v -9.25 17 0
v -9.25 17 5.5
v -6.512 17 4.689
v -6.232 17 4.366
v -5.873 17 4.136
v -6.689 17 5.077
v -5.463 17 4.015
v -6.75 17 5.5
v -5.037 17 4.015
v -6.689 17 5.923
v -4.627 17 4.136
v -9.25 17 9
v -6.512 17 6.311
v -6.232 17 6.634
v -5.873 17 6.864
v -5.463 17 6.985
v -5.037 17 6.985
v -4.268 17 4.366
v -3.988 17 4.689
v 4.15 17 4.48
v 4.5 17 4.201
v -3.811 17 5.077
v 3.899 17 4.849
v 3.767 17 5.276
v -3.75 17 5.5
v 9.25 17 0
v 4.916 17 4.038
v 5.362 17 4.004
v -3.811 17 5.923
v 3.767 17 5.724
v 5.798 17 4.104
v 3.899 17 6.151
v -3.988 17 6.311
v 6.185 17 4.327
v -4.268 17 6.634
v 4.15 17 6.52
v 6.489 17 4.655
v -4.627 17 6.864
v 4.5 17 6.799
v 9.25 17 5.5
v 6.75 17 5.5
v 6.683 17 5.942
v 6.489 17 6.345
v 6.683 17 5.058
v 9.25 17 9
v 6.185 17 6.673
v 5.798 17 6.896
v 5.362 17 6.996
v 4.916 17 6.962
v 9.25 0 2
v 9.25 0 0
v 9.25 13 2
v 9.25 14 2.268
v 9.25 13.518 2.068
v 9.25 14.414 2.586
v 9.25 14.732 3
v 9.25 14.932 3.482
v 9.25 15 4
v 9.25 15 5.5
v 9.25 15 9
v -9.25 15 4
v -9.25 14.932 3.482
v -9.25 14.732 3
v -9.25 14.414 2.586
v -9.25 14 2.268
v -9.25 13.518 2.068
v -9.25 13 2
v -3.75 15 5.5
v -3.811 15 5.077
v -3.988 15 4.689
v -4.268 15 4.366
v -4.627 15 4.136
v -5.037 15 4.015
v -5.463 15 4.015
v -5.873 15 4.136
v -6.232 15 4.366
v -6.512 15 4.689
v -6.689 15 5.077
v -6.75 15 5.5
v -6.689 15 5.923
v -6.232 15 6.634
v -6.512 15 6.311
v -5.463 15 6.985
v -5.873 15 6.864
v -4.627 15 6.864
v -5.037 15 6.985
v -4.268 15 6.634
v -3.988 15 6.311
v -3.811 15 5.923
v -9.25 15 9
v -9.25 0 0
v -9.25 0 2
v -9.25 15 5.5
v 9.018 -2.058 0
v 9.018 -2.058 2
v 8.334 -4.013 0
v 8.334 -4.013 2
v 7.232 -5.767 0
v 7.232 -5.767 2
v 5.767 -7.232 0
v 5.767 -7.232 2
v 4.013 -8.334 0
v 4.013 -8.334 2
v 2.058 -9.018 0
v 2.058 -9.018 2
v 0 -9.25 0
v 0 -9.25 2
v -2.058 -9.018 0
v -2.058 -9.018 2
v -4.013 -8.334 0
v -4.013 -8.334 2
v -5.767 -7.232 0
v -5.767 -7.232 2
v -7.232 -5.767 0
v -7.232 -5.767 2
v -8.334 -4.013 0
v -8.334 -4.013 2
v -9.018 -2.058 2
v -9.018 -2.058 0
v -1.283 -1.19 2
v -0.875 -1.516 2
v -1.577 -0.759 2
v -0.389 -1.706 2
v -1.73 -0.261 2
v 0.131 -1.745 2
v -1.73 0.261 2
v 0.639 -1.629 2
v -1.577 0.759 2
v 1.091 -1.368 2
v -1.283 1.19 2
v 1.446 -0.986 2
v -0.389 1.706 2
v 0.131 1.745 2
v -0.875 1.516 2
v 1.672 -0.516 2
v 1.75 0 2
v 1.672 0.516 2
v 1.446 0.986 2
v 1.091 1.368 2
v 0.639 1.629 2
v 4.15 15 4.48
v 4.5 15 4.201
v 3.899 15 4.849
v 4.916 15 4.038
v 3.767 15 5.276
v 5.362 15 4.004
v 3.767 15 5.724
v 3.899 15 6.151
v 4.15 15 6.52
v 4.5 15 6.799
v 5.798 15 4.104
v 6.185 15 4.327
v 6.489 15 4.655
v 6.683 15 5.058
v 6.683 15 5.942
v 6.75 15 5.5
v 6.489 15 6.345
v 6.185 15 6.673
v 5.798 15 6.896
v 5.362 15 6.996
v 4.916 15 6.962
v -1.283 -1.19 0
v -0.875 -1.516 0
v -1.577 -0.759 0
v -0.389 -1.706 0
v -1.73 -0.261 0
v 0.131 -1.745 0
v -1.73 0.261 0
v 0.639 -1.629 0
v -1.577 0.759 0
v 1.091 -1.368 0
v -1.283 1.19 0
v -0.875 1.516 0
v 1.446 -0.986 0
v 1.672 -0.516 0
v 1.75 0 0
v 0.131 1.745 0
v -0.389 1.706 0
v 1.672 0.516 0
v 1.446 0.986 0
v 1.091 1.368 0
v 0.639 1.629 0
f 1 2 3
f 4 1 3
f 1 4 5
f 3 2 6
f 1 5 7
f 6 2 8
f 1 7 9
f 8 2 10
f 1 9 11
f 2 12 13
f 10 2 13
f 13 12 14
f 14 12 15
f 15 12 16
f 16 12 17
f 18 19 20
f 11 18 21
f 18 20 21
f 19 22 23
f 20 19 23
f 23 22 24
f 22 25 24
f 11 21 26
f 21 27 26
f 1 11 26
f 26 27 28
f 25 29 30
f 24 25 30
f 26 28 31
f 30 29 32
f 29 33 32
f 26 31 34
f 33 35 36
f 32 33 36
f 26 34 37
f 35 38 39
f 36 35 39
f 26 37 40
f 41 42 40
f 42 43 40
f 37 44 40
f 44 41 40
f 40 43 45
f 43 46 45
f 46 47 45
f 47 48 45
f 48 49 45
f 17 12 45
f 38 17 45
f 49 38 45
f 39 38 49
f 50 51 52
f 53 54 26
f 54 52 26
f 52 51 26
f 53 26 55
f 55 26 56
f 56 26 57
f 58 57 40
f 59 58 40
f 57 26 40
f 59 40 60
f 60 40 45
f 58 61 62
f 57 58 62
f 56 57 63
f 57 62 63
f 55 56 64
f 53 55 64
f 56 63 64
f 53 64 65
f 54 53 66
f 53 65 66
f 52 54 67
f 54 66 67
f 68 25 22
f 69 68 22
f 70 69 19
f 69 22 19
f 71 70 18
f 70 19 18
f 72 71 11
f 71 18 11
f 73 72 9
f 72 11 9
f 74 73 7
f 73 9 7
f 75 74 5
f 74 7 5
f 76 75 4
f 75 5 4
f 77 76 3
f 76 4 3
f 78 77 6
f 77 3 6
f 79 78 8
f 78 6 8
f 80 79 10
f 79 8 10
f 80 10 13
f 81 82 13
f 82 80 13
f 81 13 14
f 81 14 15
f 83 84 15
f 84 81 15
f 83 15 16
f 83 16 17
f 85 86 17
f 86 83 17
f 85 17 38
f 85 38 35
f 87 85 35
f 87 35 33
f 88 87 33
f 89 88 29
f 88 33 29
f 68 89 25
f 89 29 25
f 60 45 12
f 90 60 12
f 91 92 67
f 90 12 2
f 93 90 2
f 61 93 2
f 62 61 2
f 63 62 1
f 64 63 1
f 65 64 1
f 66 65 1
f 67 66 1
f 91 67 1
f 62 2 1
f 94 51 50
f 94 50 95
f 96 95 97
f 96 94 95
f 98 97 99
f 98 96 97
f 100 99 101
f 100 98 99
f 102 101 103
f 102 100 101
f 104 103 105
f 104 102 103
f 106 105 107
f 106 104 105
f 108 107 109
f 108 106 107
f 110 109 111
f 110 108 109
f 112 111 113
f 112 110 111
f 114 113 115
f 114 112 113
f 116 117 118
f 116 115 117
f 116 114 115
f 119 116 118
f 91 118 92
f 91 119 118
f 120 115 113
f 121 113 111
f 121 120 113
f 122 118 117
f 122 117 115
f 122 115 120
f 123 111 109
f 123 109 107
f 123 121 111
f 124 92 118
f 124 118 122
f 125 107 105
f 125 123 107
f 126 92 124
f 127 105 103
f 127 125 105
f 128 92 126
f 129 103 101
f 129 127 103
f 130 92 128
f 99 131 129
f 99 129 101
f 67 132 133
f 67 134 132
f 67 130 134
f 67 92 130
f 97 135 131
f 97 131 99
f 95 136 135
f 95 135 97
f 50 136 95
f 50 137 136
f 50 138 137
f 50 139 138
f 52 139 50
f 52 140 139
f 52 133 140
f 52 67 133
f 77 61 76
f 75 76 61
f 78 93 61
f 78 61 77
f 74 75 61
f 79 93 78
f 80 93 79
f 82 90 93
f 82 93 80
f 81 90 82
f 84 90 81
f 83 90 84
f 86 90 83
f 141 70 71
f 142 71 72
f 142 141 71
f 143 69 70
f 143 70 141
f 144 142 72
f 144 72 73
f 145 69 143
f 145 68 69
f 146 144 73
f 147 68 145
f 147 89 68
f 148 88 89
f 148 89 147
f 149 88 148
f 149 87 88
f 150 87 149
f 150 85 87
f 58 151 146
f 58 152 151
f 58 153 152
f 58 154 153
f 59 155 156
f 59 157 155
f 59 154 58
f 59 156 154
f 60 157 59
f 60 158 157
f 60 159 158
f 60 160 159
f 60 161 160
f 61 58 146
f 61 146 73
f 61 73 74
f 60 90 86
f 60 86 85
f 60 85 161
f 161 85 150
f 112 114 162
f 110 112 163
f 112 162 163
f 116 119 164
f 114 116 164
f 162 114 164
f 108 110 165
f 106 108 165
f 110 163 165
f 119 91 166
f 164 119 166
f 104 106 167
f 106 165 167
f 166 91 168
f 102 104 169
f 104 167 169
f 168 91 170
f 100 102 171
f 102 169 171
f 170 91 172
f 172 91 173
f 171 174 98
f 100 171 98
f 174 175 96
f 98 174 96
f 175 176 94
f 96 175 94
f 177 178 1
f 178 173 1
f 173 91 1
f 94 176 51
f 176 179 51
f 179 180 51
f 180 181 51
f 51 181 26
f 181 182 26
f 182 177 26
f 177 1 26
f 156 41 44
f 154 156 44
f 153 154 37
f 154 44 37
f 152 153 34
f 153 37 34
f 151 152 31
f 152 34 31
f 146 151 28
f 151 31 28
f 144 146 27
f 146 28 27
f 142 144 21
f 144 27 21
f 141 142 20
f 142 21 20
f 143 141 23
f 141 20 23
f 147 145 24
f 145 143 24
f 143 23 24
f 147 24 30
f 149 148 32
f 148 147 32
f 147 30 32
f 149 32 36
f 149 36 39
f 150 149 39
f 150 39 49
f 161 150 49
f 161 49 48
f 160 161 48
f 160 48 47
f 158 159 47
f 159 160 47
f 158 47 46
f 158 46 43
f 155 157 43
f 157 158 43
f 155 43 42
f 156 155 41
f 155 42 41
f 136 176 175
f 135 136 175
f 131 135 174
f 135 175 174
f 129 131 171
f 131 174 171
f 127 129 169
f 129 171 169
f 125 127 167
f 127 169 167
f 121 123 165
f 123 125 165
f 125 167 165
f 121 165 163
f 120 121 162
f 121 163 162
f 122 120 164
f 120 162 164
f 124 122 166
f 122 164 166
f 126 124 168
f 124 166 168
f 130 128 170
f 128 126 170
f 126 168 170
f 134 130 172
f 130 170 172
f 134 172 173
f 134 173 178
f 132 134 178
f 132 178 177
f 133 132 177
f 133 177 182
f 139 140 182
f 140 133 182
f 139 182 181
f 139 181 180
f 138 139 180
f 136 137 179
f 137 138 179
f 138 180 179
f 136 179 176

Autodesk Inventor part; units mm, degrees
ref_plane "YZ Plane" through (0, 0, 0) normal (1, 0, 0) x (0, 1, 0)
ref_plane "XZ Plane" through (0, 0, 0) normal (0, 1, 0) x (-1, 0, 0)
ref_plane "XY Plane" through (0, 0, 0) normal (0, 0, 1) x (1, 0, 0)
sketch "Boceto1" plane through (0, 0, 0) normal (0, 0, 1) x (1, 0, 0)
  circle A0 centre (0, 0) radius 1.75
  circle A1 centre (0, 0) radius 9.25
  line L0 (43, 17) -> (-96.75, 17) projected
  line L1 (-9.25, 0) -> (-9.25, 17)
  line L2 (9.25, 0) -> (9.25, 17)
  dimension "d0" = 3.5
  dimension "d1" = 18.5
extrude "Extrusión1" add sketch "Boceto1" along normal blind 2
ref_plane "Plano de trabajo1" through (83.25, 17, -70.5) normal (0, -1, 0) x (1, 0, 0)
sketch "Boceto3" plane through (83.25, 17, -70.5) normal (0, -1, 0) x (1, 0, 0)
  line L0 (-74, 72.5) -> (-92.5, 72.5) projected
  line L1 (-92.5, 72.5) -> (-74, 72.5)
  line L2 (-74, 72.5) -> (-74, 79.5)
  line L3 (-74, 79.5) -> (-92.5, 79.5)
  line L4 (-92.5, 79.5) -> (-92.5, 72.5)
  line L5 (-74, 76) -> (-78, 76)
  circle A0 centre (-78, 76) radius 1.5
  line L6 (-92.5, 76) -> (-88.5, 76)
  circle A1 centre (-88.5, 76) radius 1.5
  point P0 (-83.25, 70.5)
  dimension "d4" = 7
  dimension "d5" = 4
  dimension "d6" = 3
  dimension "d7" = 4
  dimension "d8" = 3
extrude "Extrusión2" add sketch "Boceto3" along normal blind 2
fillet "Empalme1" radius 2 1 edges at (0, 15, 2)
properties part number "Soporte Motor"
